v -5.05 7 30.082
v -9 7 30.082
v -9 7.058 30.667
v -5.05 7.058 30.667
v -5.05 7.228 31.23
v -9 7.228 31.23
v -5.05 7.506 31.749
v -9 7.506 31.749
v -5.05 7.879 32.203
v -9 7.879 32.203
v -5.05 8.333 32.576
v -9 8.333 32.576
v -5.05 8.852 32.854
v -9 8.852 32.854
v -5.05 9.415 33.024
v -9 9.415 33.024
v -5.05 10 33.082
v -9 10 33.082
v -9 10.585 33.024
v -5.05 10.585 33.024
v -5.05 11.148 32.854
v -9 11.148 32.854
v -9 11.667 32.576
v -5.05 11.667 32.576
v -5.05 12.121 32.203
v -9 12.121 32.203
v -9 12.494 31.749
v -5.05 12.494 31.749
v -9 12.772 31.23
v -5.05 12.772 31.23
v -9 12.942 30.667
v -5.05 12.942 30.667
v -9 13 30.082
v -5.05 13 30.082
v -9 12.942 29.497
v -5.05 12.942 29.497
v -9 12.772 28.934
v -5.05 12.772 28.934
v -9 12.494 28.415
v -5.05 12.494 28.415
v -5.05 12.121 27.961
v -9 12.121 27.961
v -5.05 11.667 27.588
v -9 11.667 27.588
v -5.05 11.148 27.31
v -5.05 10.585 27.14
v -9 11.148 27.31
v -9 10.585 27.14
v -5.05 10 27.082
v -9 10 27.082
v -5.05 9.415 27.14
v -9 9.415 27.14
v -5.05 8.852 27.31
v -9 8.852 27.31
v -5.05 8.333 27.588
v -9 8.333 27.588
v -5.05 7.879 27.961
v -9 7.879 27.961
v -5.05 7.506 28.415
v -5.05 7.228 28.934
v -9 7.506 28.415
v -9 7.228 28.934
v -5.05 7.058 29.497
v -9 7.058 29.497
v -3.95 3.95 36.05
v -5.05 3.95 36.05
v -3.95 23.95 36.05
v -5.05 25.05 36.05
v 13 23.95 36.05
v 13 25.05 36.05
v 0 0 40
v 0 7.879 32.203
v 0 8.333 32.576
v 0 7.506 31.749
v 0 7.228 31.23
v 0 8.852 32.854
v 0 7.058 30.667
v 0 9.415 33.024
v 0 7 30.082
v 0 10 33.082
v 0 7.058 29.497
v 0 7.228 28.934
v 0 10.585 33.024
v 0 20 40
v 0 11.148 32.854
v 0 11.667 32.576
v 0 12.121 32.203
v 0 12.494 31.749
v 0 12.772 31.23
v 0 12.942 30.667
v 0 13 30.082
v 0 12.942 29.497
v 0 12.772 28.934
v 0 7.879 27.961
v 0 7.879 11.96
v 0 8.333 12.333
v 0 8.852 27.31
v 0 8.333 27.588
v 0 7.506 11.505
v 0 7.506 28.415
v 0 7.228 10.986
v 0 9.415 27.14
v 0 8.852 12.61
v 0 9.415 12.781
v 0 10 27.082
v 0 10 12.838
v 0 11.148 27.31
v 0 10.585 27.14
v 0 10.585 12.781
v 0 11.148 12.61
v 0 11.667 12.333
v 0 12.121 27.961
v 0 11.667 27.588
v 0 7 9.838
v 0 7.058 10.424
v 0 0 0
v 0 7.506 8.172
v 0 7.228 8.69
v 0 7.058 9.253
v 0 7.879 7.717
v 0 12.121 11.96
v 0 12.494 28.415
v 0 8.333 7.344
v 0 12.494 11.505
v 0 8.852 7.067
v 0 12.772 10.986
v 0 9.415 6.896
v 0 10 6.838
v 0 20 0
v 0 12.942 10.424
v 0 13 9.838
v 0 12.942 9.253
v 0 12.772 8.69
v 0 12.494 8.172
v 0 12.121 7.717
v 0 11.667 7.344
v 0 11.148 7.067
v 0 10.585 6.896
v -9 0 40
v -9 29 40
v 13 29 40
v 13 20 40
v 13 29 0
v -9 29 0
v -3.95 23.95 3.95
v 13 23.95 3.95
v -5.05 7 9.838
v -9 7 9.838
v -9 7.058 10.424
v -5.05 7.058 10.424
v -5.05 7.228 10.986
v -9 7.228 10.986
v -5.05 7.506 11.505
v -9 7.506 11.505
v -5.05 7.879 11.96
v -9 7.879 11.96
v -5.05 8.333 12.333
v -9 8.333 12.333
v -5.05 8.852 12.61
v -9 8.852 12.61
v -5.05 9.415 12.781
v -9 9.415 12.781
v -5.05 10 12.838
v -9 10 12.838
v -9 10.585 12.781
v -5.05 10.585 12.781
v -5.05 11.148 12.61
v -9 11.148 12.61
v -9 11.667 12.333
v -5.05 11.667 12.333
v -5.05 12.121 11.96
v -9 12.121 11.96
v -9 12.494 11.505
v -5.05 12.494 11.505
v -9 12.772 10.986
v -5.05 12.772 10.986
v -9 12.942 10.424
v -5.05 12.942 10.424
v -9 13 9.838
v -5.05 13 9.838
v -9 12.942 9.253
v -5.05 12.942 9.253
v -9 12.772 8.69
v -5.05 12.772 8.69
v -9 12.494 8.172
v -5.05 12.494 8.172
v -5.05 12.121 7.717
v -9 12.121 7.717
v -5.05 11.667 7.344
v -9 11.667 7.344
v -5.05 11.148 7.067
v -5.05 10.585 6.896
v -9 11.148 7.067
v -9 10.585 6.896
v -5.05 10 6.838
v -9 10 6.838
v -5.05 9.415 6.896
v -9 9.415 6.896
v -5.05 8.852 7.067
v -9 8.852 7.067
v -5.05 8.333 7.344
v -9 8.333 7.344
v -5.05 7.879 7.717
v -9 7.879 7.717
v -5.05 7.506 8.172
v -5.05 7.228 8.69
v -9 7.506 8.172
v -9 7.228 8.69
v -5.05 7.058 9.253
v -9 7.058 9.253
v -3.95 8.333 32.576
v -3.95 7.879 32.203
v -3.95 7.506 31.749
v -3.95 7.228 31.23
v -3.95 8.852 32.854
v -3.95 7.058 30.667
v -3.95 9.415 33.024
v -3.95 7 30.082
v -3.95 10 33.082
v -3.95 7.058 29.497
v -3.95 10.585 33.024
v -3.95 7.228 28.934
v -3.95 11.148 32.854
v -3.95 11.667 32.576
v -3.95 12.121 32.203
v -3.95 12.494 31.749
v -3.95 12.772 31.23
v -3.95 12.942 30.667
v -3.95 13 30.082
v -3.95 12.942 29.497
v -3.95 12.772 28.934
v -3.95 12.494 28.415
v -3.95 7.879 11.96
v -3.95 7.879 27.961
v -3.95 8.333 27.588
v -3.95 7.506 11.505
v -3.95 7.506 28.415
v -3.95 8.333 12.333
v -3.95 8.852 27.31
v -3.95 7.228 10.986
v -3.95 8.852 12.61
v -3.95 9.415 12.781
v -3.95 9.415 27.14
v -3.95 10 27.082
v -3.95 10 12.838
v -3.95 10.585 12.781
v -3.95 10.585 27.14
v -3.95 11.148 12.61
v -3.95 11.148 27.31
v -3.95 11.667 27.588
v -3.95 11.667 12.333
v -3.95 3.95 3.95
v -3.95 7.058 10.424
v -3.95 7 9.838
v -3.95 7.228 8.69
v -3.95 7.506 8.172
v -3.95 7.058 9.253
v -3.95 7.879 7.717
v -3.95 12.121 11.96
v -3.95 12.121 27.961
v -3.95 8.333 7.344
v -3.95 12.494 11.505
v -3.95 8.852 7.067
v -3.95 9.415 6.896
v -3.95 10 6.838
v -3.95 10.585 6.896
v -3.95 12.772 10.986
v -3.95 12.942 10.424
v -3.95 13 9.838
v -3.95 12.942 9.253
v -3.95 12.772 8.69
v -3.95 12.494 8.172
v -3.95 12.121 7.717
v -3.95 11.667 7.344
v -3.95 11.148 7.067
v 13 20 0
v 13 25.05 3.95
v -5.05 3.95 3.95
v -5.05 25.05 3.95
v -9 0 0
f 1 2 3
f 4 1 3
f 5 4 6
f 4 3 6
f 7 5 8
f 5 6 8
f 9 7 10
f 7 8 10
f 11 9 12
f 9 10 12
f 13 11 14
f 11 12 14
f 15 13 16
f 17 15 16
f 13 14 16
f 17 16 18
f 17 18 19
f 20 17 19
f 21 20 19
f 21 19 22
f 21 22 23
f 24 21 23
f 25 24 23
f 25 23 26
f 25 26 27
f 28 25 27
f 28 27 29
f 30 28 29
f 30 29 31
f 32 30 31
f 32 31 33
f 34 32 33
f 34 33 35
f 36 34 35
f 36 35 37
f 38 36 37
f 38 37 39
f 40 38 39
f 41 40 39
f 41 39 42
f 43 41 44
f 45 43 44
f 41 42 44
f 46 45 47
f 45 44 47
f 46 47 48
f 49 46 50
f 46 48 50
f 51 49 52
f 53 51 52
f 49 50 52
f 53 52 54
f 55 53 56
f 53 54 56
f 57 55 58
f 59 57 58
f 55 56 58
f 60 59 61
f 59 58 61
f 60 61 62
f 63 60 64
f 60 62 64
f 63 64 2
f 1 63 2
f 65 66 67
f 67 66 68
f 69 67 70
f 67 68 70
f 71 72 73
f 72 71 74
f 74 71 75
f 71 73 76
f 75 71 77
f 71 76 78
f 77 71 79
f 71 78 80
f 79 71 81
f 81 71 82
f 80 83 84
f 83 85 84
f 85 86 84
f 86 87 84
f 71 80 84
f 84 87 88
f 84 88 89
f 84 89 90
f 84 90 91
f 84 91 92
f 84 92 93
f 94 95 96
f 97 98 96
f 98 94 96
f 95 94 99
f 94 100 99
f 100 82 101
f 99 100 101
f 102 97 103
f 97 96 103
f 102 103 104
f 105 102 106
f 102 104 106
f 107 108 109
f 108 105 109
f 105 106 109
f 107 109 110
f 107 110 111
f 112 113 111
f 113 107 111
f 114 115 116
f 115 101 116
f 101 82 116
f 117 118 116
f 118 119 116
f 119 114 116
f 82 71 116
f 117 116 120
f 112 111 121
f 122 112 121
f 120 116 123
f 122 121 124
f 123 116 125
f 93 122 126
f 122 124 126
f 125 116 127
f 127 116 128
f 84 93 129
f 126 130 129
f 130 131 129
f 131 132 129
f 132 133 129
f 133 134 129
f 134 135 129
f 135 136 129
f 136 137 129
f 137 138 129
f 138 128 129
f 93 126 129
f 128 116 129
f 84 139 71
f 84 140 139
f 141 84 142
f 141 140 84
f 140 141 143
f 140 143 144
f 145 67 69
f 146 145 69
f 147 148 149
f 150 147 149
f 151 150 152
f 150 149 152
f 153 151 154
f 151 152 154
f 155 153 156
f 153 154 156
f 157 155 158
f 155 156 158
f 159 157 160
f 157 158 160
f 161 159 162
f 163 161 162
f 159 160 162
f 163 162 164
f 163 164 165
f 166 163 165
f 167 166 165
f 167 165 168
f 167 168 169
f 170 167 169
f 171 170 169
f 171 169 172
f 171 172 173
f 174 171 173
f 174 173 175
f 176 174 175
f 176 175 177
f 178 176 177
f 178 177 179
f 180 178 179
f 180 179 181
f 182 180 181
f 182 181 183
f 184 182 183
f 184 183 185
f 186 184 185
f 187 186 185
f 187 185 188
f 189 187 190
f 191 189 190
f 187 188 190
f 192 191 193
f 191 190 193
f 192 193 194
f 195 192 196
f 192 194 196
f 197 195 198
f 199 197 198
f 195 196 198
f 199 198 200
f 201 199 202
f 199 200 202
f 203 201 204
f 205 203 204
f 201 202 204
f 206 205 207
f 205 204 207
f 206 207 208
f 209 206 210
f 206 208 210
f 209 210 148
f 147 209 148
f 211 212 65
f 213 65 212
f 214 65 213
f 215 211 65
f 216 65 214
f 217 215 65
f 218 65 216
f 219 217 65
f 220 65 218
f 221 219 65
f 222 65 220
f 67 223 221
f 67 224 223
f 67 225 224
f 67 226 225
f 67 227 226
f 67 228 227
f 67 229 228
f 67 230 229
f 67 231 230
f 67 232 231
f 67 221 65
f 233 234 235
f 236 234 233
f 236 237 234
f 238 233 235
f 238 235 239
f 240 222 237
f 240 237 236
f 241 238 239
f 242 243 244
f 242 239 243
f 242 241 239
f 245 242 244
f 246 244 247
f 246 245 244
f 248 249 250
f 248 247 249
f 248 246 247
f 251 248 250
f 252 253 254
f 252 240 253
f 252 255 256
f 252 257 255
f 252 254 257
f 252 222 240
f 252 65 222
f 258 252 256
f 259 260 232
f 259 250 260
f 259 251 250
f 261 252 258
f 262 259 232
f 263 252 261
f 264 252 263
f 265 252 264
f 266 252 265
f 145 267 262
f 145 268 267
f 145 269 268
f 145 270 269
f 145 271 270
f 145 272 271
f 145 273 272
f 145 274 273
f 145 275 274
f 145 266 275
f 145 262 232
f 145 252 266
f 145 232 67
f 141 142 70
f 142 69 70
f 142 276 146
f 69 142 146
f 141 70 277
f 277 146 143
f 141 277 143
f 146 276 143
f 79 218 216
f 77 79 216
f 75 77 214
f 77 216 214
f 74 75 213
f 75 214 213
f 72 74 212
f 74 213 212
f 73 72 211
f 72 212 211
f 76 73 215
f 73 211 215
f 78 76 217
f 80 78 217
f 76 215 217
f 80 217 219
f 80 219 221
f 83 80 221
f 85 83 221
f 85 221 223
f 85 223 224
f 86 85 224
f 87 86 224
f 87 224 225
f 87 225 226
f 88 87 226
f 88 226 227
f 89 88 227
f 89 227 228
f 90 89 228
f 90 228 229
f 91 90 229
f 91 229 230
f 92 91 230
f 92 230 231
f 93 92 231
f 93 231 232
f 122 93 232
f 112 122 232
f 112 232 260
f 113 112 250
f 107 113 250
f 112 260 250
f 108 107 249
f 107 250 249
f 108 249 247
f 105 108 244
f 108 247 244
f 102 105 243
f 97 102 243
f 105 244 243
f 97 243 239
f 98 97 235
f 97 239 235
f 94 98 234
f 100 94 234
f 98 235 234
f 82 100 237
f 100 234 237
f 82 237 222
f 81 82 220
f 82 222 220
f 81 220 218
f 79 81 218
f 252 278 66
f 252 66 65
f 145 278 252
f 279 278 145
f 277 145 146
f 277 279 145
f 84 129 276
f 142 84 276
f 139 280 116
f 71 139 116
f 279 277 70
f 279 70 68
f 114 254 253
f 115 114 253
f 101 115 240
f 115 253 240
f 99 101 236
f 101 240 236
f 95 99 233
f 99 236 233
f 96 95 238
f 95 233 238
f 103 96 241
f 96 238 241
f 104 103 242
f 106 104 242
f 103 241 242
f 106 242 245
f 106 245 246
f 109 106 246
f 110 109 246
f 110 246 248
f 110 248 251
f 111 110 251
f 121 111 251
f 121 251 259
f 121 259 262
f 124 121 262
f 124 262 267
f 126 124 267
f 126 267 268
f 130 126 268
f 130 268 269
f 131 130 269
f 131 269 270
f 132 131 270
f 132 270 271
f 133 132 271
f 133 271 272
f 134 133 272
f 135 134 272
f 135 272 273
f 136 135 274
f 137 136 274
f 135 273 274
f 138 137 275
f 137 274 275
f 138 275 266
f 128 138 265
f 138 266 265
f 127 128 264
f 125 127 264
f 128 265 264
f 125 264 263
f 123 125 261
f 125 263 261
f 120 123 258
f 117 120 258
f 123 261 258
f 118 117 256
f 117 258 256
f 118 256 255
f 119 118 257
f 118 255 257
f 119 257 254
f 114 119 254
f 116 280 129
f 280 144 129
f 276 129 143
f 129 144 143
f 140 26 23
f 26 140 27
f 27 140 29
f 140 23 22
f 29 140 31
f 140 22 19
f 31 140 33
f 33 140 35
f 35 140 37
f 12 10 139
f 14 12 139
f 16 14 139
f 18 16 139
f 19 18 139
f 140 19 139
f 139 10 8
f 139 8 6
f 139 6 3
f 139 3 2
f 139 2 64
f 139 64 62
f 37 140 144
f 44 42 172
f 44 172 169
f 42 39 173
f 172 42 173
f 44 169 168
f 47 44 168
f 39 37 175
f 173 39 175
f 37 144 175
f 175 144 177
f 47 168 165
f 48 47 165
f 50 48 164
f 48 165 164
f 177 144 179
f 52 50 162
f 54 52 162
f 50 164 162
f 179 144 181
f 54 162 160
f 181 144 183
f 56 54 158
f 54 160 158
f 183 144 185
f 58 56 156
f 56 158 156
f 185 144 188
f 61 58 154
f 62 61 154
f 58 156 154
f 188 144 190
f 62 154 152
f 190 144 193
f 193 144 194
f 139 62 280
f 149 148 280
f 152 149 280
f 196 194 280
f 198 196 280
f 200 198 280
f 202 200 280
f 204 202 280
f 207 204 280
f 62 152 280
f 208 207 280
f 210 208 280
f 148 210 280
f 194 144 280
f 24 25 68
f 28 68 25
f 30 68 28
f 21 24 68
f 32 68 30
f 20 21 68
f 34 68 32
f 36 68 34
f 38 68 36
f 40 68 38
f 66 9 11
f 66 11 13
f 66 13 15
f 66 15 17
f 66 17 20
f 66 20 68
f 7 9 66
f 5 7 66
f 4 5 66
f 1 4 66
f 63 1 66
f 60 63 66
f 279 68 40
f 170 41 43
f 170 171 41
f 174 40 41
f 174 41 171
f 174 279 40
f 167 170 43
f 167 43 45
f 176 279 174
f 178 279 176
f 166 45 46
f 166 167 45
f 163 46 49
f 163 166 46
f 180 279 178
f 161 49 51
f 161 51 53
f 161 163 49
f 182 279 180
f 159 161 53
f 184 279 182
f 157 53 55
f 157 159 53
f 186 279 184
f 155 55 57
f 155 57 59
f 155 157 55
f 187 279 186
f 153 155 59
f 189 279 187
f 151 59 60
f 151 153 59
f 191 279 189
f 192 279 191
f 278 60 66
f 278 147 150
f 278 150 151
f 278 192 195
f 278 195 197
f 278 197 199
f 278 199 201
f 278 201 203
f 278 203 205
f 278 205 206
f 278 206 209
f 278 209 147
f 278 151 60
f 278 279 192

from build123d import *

# Parameters (mm, degrees)
F1_DEPTH = 40
F3_T     = -3.95
F4_D     = 6


with BuildPart() as f1:
    # F0 (on Top) → F1 (new body)
    with BuildSketch(Plane.XY):
        Polygon((-9, 0), (0, 0), (0, 20), (13, 20), (13, 29), (-9, 29), (-9, 20), align=None)
    extrude(amount=F1_DEPTH)

    # F3
    f3_openings = [f1.faces().sort_by_distance(p)[0] for p in [
        (13, 24.5, 20),
    ]]
    offset(amount=F3_T, openings=f3_openings, kind=Kind.INTERSECTION)

    # F4 (through all)
    with Locations(Plane.YZ):
        with Locations((10, 30.0820767879), (10, 9.8383650184)):
            Hole(F4_D / 2)


solid = f1.part
